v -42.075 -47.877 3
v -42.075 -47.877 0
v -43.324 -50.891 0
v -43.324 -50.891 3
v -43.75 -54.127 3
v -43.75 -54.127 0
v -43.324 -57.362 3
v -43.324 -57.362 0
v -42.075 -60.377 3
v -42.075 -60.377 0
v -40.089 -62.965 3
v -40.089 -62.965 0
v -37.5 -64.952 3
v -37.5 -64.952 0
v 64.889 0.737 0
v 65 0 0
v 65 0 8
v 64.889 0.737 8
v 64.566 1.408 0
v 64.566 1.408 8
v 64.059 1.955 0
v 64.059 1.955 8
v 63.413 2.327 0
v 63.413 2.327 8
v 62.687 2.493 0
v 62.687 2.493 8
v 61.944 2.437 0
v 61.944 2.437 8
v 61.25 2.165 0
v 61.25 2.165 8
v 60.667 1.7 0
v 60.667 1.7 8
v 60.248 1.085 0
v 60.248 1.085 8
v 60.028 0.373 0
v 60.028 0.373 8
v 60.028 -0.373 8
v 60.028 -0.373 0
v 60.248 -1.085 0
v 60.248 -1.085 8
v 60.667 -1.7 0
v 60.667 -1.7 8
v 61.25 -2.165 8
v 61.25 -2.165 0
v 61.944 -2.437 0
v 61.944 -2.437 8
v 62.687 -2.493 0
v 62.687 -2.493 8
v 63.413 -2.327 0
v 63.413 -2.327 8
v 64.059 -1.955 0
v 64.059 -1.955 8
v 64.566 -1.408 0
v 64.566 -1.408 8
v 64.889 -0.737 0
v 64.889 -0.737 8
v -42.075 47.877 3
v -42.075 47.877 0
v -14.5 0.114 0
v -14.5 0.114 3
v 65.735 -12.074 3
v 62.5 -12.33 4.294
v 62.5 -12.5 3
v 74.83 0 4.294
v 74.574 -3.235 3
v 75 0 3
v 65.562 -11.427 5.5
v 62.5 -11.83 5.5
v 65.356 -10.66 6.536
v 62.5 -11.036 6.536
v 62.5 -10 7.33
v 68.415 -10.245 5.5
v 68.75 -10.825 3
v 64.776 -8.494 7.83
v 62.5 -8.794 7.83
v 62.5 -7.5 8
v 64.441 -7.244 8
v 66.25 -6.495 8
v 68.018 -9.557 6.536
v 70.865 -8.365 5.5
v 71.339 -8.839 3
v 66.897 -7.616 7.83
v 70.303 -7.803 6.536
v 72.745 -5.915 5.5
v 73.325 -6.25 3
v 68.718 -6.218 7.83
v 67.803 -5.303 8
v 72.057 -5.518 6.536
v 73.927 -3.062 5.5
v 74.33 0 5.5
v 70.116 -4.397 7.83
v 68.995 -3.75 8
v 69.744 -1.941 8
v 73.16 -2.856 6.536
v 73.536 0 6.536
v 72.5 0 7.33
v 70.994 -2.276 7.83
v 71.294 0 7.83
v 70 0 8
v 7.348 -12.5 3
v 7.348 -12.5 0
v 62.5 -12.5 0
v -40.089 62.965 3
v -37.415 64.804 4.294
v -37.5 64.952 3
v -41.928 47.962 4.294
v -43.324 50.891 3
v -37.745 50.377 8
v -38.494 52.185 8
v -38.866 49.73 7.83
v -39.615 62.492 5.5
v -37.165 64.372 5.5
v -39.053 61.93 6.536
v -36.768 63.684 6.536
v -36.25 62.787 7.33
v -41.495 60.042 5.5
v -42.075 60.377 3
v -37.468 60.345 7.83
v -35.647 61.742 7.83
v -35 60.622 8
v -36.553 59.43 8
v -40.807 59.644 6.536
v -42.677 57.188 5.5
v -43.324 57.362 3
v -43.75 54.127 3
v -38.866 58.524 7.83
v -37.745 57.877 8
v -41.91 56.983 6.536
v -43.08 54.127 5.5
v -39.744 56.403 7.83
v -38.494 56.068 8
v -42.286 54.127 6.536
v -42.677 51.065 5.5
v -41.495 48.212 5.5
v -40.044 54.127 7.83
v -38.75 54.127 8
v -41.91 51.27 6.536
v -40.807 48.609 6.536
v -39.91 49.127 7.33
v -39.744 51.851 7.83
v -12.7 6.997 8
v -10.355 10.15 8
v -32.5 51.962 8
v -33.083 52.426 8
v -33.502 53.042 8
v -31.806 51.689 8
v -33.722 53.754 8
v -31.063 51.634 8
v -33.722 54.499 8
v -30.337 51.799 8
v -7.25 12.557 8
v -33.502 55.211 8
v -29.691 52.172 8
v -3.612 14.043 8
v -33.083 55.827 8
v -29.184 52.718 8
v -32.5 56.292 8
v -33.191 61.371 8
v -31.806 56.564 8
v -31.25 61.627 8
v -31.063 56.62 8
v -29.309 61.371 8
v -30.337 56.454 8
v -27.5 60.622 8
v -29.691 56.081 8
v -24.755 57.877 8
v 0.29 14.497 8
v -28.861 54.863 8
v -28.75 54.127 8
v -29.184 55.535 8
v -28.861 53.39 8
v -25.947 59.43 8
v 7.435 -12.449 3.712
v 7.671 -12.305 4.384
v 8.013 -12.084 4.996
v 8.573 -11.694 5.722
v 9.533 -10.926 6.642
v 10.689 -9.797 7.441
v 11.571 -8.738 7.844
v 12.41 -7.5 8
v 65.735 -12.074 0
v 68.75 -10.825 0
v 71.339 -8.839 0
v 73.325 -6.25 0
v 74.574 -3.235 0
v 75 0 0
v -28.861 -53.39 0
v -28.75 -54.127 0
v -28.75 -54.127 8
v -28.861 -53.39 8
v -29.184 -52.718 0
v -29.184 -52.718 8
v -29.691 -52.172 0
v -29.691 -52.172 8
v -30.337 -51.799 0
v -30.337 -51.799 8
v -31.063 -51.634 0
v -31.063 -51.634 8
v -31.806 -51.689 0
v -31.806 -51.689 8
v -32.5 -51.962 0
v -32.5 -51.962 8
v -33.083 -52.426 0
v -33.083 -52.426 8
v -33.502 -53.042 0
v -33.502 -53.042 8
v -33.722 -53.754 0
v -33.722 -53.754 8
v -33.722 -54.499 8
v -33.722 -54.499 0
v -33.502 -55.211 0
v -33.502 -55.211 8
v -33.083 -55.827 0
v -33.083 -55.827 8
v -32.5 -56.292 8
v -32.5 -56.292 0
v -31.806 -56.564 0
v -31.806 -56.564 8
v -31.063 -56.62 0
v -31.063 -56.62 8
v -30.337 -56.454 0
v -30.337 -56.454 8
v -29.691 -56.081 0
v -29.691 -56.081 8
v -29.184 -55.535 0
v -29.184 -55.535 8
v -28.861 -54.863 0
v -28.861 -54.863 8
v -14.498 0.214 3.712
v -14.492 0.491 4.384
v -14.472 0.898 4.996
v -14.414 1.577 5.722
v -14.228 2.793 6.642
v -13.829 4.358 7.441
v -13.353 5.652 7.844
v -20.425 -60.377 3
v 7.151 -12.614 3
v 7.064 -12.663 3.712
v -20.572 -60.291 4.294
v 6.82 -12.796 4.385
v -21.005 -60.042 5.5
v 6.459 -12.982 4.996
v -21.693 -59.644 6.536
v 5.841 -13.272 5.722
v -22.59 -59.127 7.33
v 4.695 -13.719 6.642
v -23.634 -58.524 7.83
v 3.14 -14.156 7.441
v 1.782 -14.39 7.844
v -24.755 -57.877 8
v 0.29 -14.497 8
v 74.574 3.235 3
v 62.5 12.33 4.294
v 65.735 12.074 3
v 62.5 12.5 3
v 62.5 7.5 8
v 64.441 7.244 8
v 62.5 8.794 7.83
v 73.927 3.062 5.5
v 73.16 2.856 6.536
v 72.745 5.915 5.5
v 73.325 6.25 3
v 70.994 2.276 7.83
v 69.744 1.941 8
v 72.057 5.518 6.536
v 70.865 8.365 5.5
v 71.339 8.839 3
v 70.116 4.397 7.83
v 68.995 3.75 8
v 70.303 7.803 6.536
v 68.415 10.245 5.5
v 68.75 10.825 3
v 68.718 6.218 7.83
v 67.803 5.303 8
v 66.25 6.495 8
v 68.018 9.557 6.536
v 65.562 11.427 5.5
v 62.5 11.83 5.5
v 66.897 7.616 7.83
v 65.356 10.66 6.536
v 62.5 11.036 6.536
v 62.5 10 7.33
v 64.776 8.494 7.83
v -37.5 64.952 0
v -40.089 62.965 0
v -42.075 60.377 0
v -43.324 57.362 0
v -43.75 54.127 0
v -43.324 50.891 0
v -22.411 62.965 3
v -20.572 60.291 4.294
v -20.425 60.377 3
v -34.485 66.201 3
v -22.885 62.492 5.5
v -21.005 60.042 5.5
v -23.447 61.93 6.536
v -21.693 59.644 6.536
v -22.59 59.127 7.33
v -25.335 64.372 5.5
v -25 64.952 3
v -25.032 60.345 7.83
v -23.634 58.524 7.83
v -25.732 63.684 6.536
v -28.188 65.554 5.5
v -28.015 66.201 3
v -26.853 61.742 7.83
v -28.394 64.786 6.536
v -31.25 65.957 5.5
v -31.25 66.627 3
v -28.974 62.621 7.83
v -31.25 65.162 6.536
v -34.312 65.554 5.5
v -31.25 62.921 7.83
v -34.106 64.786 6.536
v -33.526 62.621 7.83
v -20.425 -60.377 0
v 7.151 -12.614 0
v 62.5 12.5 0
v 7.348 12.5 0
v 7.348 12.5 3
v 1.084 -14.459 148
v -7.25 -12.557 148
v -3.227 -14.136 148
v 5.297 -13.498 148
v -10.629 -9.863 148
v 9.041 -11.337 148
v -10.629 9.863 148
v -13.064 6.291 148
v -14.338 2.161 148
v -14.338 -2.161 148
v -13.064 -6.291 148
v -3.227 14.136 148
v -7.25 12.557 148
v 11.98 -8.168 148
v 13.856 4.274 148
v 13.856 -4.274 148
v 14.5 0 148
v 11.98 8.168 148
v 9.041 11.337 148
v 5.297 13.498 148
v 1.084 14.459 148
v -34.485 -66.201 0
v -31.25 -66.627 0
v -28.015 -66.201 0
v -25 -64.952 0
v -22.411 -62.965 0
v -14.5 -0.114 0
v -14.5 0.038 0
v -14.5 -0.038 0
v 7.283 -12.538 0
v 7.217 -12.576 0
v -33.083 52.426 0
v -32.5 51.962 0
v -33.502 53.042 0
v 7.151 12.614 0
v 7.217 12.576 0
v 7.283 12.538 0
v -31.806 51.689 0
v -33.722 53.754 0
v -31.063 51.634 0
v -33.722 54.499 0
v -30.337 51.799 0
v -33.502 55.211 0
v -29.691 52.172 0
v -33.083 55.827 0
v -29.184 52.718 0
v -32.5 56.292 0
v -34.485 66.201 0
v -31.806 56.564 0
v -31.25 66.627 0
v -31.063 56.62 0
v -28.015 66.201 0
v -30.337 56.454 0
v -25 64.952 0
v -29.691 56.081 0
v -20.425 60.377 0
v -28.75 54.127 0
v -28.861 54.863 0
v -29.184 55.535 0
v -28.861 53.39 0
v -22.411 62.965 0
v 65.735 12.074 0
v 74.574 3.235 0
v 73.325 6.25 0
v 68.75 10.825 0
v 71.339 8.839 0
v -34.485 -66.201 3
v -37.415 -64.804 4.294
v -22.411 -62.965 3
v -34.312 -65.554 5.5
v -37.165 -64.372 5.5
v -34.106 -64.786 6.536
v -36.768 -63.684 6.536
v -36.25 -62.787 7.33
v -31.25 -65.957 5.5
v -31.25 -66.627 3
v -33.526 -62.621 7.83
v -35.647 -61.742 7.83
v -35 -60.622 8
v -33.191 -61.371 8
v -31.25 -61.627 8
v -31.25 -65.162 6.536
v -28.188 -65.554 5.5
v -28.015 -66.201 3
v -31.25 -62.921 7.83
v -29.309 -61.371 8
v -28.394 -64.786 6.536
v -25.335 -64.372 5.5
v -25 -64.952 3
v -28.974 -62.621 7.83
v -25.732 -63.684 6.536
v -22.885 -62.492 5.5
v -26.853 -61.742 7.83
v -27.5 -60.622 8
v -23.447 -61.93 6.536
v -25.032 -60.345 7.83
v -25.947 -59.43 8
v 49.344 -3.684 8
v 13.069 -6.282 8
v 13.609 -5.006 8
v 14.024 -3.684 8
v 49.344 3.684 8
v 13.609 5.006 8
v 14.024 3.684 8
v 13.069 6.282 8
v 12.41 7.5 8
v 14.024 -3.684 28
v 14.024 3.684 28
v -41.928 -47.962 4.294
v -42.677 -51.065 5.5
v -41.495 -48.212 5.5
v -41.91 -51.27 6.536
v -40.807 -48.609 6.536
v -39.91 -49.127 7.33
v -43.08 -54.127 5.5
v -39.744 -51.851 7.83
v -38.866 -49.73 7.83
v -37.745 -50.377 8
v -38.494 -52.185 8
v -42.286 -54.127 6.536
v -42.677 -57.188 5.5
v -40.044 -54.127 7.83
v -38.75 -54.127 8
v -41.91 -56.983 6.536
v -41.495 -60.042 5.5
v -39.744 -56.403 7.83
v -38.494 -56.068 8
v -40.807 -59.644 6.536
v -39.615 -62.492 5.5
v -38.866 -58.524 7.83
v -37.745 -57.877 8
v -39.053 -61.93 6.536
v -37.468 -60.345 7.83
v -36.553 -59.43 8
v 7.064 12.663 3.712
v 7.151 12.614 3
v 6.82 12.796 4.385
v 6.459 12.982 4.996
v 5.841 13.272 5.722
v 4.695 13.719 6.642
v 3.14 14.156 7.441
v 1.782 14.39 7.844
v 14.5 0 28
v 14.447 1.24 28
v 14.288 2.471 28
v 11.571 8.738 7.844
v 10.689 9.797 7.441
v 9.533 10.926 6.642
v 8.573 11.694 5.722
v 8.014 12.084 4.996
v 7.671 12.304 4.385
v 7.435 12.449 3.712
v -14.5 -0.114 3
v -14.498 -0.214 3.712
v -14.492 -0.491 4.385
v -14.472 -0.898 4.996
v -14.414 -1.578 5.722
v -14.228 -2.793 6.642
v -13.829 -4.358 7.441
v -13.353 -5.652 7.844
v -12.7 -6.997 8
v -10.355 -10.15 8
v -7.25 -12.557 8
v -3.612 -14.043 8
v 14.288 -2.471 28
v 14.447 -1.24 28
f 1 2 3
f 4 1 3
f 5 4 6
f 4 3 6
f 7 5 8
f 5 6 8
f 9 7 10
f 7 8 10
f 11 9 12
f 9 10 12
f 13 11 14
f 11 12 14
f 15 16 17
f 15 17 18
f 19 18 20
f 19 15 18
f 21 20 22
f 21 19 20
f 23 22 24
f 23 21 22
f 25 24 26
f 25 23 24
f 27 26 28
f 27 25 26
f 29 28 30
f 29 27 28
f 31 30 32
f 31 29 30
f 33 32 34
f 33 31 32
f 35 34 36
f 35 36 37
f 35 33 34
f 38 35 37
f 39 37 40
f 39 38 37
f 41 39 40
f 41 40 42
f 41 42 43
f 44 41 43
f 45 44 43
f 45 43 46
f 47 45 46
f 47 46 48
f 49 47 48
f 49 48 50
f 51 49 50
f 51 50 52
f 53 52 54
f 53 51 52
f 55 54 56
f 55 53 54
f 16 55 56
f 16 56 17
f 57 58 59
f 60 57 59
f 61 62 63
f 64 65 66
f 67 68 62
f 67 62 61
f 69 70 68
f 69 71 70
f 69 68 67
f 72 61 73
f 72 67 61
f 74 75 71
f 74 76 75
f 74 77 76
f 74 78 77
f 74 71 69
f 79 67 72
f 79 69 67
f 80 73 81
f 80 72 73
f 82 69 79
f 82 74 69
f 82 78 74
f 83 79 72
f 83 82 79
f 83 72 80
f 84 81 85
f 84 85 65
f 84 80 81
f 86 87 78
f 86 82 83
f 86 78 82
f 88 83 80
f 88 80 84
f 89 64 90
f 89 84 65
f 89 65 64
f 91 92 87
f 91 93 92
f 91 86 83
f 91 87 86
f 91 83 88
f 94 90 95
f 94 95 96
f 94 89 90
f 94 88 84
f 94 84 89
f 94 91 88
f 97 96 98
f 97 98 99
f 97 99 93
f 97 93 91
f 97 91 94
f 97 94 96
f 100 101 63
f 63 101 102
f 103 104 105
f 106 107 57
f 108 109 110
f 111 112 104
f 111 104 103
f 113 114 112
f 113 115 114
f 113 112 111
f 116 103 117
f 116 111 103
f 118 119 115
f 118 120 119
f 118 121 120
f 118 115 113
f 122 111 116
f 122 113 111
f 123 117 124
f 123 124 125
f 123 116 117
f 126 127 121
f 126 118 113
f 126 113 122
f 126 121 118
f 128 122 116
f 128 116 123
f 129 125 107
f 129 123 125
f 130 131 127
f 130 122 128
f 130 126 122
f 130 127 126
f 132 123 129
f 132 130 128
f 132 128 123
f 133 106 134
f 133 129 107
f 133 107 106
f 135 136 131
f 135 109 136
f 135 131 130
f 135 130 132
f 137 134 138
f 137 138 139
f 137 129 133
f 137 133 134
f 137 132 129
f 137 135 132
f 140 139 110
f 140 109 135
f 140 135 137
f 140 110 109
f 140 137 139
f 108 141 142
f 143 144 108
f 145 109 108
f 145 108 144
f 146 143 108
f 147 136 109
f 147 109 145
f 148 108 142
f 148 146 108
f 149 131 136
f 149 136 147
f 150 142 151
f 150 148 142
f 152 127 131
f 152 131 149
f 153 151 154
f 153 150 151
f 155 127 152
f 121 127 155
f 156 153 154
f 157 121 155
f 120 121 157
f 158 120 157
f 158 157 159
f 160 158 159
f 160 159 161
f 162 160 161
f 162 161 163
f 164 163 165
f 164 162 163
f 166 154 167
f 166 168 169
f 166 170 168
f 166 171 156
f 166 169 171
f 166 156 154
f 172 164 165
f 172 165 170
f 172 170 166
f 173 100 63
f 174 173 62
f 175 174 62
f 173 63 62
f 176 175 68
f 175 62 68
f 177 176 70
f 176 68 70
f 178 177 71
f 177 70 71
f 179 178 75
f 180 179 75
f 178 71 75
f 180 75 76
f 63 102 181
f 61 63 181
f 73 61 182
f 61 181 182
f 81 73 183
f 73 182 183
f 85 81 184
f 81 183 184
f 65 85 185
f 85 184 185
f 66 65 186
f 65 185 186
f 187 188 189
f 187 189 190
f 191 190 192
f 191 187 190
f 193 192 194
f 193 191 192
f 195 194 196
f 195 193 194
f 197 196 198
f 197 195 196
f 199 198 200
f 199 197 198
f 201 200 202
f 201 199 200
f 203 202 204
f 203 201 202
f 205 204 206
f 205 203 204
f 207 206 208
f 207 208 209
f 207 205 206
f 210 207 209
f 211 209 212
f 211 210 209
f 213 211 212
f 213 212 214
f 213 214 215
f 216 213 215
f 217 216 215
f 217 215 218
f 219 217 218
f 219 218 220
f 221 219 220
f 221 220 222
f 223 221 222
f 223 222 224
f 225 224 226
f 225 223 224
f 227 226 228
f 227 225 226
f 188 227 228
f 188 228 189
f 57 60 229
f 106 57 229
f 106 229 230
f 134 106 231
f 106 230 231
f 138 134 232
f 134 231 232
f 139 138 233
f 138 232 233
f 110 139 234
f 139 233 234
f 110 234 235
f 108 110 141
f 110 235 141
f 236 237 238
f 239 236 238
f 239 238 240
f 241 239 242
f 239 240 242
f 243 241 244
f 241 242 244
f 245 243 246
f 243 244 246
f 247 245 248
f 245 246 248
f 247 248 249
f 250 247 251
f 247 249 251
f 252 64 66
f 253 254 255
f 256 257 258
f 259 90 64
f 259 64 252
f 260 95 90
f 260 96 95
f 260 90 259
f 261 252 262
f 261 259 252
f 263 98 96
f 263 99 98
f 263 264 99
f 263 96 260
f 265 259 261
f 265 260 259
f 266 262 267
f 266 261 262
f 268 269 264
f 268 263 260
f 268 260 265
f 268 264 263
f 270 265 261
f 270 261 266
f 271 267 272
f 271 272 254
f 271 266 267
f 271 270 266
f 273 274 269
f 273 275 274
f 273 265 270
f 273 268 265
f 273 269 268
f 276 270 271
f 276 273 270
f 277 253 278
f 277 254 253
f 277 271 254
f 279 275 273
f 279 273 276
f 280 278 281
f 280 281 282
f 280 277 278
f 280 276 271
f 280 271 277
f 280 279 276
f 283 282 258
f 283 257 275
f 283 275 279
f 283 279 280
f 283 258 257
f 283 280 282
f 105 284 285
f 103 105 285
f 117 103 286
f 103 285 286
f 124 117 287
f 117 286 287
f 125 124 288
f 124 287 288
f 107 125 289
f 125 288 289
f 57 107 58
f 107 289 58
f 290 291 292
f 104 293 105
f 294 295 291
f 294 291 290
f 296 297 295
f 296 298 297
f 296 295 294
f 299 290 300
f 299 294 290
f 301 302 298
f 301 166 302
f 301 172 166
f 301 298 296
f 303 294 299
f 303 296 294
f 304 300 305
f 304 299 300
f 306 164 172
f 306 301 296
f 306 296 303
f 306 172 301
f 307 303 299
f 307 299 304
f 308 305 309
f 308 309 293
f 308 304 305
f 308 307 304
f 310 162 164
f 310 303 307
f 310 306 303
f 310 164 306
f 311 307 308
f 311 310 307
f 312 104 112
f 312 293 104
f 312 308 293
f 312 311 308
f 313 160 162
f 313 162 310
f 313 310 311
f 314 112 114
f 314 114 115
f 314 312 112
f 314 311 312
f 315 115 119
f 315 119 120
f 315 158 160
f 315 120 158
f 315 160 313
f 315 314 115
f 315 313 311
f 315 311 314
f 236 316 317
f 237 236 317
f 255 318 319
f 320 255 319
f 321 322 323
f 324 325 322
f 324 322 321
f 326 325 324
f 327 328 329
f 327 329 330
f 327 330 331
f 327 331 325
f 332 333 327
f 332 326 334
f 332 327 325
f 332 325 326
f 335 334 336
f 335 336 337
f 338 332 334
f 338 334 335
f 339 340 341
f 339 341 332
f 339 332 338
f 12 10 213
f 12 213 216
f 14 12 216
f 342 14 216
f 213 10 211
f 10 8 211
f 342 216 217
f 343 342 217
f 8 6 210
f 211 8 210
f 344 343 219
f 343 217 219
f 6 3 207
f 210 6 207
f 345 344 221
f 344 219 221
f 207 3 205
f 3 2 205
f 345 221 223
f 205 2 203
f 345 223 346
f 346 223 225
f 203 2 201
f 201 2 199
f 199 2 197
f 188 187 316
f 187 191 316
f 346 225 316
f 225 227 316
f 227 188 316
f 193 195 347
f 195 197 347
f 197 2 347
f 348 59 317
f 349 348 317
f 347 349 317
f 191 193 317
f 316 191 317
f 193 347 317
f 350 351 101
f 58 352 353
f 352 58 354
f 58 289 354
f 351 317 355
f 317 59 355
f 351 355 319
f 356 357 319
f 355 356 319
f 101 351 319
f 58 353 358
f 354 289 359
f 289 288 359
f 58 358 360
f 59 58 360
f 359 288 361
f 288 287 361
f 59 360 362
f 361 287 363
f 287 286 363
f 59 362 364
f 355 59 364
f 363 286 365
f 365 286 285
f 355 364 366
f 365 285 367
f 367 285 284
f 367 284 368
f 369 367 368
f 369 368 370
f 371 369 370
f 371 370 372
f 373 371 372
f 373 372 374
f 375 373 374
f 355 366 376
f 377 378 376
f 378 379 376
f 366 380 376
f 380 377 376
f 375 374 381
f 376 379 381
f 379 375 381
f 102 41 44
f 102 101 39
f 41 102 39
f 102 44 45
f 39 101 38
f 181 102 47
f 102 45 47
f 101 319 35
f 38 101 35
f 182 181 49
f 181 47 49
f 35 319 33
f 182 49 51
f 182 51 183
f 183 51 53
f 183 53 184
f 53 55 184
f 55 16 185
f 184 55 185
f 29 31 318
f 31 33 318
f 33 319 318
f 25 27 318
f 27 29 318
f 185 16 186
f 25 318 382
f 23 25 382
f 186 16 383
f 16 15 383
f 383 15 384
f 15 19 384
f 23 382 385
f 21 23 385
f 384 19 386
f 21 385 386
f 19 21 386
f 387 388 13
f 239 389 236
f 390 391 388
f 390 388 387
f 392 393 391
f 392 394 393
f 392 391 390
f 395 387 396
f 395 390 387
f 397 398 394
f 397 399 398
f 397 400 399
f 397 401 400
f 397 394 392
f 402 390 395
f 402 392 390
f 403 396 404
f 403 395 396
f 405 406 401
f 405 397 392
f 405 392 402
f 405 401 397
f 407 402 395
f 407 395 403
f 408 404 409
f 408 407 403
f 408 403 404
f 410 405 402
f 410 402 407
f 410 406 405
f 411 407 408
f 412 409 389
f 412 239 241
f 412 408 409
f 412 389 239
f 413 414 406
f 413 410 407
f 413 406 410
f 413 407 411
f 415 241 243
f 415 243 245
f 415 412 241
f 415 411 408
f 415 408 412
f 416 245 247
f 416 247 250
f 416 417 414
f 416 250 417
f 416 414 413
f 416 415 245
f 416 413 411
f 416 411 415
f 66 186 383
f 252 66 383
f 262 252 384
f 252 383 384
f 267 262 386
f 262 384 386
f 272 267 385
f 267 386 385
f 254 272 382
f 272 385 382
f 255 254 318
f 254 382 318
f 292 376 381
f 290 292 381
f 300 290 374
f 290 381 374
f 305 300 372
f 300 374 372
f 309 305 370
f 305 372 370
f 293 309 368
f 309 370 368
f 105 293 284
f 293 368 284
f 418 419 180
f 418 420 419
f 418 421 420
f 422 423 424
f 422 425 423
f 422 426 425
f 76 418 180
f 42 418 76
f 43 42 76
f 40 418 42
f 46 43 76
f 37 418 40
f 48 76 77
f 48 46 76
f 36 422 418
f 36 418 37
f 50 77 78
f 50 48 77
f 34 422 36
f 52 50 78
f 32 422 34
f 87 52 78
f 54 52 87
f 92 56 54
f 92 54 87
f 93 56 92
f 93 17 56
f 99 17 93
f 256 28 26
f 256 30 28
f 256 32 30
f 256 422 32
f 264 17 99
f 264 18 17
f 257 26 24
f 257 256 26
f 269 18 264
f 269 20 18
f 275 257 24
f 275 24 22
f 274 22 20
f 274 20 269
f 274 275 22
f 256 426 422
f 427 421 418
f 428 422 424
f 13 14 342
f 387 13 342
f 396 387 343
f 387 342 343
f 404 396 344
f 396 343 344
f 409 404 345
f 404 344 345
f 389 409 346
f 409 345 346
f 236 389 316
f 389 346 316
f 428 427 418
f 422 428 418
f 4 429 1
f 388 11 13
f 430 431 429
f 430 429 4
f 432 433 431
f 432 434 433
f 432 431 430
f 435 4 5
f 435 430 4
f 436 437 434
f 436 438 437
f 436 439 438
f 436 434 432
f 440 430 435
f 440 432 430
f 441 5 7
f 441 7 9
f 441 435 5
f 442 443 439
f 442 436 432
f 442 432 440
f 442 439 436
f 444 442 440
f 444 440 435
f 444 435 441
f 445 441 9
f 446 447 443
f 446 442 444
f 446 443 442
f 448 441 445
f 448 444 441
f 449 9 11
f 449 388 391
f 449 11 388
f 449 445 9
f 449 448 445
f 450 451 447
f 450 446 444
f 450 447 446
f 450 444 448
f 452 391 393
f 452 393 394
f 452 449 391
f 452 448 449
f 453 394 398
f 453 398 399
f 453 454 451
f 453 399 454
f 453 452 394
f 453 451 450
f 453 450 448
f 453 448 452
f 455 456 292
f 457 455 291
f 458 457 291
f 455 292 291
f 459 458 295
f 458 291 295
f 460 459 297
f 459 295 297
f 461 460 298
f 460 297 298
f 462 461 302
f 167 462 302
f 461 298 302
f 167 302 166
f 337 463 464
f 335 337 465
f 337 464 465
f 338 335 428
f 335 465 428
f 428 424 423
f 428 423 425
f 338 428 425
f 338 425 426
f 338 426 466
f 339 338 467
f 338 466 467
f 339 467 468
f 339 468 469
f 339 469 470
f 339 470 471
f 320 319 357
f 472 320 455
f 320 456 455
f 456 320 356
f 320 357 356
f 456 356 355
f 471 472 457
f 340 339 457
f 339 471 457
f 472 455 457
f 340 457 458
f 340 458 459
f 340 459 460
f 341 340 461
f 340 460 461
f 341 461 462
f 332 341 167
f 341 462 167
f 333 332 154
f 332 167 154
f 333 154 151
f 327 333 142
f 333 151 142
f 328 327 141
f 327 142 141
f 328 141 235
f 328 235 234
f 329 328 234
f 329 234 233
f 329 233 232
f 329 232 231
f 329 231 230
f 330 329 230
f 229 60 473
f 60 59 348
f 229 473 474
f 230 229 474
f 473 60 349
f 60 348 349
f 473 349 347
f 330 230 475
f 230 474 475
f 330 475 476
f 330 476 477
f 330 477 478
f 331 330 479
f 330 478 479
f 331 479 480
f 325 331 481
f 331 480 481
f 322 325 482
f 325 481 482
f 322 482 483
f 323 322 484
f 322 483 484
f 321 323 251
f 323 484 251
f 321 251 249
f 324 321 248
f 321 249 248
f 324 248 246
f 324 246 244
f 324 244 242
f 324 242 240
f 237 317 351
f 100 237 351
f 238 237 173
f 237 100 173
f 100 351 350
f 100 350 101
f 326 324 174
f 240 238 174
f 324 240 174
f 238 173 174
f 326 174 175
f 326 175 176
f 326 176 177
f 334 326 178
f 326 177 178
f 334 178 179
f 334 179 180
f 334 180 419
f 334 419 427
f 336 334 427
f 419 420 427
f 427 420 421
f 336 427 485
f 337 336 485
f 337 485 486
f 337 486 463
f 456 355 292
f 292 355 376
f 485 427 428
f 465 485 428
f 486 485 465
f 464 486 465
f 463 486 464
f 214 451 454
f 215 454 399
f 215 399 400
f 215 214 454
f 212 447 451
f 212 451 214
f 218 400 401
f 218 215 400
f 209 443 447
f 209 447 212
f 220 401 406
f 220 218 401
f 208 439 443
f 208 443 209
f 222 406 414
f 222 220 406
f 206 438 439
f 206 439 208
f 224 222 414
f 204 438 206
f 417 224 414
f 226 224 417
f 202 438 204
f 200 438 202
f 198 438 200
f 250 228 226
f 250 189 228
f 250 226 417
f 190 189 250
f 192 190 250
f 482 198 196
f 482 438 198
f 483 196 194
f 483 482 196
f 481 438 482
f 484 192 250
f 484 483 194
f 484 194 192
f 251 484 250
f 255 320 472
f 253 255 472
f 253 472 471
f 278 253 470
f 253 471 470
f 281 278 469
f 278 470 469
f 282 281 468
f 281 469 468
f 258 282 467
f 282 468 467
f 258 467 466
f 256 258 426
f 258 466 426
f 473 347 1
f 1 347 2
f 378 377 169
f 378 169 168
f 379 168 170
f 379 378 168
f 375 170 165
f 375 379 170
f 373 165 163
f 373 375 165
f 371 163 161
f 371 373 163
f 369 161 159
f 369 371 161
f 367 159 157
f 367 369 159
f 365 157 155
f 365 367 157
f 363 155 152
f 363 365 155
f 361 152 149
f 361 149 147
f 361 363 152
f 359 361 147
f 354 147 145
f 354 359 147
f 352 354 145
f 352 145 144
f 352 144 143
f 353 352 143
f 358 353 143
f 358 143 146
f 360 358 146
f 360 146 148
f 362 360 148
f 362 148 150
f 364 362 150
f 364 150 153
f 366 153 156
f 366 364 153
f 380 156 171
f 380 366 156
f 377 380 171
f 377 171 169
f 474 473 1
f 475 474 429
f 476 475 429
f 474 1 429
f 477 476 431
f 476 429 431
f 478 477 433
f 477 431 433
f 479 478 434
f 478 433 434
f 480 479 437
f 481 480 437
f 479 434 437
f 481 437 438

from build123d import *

# Parameters (mm, degrees)
F0_R     = 2.5
F1_DEPTH = 8
F2_R     = 5
F3_R     = 14.5
F4_DEPTH = 140
F5_DEPTH = 8
F7_DEPTH = 20
F9_DEPTH = 80.7


with BuildPart() as f1:
    # F0 (on Top) → F1 (new body)
    with BuildSketch(Plane.XY):
        with BuildLine():
            ThreePointArc((75, 0), (71.3388347648, 8.8388347648), (62.5, 12.5))
            Line((62.5, 12.5), (7.2168783649, 12.5))
            Line((7.2168783649, 12.5), (-20.4246824527, 60.3765877365))
            ThreePointArc((-20.4246824527, 60.3765877365), (-28.0147619362, 66.2006605651), (-37.5, 64.9519052838))
            ThreePointArc((-37.5, 64.9519052838), (-43.3240728286, 57.3618258003), (-42.0753175473, 47.8765877365))
            Line((-42.0753175473, 47.8765877365), (-14.4337567297, 0))
            Line((-14.4337567297, 0), (-42.0753175473, -47.8765877365))
            ThreePointArc((-42.0753175473, -47.8765877365), (-43.3240728286, -57.3618258003), (-37.5, -64.9519052838))
            ThreePointArc((-37.5, -64.9519052838), (-28.0147619362, -66.2006605651), (-20.4246824527, -60.3765877365))
            Line((-20.4246824527, -60.3765877365), (7.2168783649, -12.5))
            Line((7.2168783649, -12.5), (62.5, -12.5))
            ThreePointArc((62.5, -12.5), (71.3388347648, -8.8388347648), (75, 0))
        make_face()
        with Locations((-31.25, -54.1265877365)):
            Circle(F0_R, mode=Mode.SUBTRACT)
        with Locations((62.5, 0)):
            Circle(F0_R, mode=Mode.SUBTRACT)
        with Locations((-31.25, 54.1265877365)):
            Circle(F0_R, mode=Mode.SUBTRACT)
    extrude(amount=F1_DEPTH)

    # F2
    f2_edges = [f1.edges().sort_by_distance(p)[0] for p in [
        (-37.5, 64.951905, 8),
        (-28.254537, -23.938294, 8),
        (34.858439, -12.5, 8),
    ]]
    fillet(f2_edges, radius=F2_R)

    # F3 (on face) → F4 (join)
    with BuildSketch(Plane.XY.offset(8)):
        Circle(F3_R)
    extrude(amount=F4_DEPTH)

    # F5 (add): faces of the model
    f5_faces = [f1.faces().sort_by_distance(p)[0] for p in [
        (6.0657037569, -10.5061070906, 8),
        (6.0657037569, 10.5061070906, 8),
        (-12.1314075138, 0, 8),
    ]]
    extrude(f5_faces, amount=F5_DEPTH)

    # F6 (on face) → F7 (join)
    with BuildSketch(Plane.XY.offset(8)):
        with BuildLine():
            Line((14.024142154, -3.6842145491), (49.3441671133, -3.6842145491))
            Line((49.3441671133, -3.6842145491), (49.3441671133, 3.6842145491))
            Line((49.3441671133, 3.6842145491), (14.024142154, 3.6842145491))
            ThreePointArc((14.024142154, 3.6842145491), (14.3805434743, 1.8574093204), (14.5, 0))
            ThreePointArc((14.5, 0), (14.3805434743, -1.8574093204), (14.024142154, -3.6842145491))
        make_face()
    extrude(amount=F7_DEPTH)

    # F8 (on face) → F9 (cut)
    with BuildSketch(Plane.XZ.offset(3.6842145491)):
        Polygon((14.024142154, 28), (49.3441671133, 8), (49.3441671133, 28), align=None)
    extrude(amount=-F9_DEPTH, mode=Mode.SUBTRACT)


solid = f1.part
